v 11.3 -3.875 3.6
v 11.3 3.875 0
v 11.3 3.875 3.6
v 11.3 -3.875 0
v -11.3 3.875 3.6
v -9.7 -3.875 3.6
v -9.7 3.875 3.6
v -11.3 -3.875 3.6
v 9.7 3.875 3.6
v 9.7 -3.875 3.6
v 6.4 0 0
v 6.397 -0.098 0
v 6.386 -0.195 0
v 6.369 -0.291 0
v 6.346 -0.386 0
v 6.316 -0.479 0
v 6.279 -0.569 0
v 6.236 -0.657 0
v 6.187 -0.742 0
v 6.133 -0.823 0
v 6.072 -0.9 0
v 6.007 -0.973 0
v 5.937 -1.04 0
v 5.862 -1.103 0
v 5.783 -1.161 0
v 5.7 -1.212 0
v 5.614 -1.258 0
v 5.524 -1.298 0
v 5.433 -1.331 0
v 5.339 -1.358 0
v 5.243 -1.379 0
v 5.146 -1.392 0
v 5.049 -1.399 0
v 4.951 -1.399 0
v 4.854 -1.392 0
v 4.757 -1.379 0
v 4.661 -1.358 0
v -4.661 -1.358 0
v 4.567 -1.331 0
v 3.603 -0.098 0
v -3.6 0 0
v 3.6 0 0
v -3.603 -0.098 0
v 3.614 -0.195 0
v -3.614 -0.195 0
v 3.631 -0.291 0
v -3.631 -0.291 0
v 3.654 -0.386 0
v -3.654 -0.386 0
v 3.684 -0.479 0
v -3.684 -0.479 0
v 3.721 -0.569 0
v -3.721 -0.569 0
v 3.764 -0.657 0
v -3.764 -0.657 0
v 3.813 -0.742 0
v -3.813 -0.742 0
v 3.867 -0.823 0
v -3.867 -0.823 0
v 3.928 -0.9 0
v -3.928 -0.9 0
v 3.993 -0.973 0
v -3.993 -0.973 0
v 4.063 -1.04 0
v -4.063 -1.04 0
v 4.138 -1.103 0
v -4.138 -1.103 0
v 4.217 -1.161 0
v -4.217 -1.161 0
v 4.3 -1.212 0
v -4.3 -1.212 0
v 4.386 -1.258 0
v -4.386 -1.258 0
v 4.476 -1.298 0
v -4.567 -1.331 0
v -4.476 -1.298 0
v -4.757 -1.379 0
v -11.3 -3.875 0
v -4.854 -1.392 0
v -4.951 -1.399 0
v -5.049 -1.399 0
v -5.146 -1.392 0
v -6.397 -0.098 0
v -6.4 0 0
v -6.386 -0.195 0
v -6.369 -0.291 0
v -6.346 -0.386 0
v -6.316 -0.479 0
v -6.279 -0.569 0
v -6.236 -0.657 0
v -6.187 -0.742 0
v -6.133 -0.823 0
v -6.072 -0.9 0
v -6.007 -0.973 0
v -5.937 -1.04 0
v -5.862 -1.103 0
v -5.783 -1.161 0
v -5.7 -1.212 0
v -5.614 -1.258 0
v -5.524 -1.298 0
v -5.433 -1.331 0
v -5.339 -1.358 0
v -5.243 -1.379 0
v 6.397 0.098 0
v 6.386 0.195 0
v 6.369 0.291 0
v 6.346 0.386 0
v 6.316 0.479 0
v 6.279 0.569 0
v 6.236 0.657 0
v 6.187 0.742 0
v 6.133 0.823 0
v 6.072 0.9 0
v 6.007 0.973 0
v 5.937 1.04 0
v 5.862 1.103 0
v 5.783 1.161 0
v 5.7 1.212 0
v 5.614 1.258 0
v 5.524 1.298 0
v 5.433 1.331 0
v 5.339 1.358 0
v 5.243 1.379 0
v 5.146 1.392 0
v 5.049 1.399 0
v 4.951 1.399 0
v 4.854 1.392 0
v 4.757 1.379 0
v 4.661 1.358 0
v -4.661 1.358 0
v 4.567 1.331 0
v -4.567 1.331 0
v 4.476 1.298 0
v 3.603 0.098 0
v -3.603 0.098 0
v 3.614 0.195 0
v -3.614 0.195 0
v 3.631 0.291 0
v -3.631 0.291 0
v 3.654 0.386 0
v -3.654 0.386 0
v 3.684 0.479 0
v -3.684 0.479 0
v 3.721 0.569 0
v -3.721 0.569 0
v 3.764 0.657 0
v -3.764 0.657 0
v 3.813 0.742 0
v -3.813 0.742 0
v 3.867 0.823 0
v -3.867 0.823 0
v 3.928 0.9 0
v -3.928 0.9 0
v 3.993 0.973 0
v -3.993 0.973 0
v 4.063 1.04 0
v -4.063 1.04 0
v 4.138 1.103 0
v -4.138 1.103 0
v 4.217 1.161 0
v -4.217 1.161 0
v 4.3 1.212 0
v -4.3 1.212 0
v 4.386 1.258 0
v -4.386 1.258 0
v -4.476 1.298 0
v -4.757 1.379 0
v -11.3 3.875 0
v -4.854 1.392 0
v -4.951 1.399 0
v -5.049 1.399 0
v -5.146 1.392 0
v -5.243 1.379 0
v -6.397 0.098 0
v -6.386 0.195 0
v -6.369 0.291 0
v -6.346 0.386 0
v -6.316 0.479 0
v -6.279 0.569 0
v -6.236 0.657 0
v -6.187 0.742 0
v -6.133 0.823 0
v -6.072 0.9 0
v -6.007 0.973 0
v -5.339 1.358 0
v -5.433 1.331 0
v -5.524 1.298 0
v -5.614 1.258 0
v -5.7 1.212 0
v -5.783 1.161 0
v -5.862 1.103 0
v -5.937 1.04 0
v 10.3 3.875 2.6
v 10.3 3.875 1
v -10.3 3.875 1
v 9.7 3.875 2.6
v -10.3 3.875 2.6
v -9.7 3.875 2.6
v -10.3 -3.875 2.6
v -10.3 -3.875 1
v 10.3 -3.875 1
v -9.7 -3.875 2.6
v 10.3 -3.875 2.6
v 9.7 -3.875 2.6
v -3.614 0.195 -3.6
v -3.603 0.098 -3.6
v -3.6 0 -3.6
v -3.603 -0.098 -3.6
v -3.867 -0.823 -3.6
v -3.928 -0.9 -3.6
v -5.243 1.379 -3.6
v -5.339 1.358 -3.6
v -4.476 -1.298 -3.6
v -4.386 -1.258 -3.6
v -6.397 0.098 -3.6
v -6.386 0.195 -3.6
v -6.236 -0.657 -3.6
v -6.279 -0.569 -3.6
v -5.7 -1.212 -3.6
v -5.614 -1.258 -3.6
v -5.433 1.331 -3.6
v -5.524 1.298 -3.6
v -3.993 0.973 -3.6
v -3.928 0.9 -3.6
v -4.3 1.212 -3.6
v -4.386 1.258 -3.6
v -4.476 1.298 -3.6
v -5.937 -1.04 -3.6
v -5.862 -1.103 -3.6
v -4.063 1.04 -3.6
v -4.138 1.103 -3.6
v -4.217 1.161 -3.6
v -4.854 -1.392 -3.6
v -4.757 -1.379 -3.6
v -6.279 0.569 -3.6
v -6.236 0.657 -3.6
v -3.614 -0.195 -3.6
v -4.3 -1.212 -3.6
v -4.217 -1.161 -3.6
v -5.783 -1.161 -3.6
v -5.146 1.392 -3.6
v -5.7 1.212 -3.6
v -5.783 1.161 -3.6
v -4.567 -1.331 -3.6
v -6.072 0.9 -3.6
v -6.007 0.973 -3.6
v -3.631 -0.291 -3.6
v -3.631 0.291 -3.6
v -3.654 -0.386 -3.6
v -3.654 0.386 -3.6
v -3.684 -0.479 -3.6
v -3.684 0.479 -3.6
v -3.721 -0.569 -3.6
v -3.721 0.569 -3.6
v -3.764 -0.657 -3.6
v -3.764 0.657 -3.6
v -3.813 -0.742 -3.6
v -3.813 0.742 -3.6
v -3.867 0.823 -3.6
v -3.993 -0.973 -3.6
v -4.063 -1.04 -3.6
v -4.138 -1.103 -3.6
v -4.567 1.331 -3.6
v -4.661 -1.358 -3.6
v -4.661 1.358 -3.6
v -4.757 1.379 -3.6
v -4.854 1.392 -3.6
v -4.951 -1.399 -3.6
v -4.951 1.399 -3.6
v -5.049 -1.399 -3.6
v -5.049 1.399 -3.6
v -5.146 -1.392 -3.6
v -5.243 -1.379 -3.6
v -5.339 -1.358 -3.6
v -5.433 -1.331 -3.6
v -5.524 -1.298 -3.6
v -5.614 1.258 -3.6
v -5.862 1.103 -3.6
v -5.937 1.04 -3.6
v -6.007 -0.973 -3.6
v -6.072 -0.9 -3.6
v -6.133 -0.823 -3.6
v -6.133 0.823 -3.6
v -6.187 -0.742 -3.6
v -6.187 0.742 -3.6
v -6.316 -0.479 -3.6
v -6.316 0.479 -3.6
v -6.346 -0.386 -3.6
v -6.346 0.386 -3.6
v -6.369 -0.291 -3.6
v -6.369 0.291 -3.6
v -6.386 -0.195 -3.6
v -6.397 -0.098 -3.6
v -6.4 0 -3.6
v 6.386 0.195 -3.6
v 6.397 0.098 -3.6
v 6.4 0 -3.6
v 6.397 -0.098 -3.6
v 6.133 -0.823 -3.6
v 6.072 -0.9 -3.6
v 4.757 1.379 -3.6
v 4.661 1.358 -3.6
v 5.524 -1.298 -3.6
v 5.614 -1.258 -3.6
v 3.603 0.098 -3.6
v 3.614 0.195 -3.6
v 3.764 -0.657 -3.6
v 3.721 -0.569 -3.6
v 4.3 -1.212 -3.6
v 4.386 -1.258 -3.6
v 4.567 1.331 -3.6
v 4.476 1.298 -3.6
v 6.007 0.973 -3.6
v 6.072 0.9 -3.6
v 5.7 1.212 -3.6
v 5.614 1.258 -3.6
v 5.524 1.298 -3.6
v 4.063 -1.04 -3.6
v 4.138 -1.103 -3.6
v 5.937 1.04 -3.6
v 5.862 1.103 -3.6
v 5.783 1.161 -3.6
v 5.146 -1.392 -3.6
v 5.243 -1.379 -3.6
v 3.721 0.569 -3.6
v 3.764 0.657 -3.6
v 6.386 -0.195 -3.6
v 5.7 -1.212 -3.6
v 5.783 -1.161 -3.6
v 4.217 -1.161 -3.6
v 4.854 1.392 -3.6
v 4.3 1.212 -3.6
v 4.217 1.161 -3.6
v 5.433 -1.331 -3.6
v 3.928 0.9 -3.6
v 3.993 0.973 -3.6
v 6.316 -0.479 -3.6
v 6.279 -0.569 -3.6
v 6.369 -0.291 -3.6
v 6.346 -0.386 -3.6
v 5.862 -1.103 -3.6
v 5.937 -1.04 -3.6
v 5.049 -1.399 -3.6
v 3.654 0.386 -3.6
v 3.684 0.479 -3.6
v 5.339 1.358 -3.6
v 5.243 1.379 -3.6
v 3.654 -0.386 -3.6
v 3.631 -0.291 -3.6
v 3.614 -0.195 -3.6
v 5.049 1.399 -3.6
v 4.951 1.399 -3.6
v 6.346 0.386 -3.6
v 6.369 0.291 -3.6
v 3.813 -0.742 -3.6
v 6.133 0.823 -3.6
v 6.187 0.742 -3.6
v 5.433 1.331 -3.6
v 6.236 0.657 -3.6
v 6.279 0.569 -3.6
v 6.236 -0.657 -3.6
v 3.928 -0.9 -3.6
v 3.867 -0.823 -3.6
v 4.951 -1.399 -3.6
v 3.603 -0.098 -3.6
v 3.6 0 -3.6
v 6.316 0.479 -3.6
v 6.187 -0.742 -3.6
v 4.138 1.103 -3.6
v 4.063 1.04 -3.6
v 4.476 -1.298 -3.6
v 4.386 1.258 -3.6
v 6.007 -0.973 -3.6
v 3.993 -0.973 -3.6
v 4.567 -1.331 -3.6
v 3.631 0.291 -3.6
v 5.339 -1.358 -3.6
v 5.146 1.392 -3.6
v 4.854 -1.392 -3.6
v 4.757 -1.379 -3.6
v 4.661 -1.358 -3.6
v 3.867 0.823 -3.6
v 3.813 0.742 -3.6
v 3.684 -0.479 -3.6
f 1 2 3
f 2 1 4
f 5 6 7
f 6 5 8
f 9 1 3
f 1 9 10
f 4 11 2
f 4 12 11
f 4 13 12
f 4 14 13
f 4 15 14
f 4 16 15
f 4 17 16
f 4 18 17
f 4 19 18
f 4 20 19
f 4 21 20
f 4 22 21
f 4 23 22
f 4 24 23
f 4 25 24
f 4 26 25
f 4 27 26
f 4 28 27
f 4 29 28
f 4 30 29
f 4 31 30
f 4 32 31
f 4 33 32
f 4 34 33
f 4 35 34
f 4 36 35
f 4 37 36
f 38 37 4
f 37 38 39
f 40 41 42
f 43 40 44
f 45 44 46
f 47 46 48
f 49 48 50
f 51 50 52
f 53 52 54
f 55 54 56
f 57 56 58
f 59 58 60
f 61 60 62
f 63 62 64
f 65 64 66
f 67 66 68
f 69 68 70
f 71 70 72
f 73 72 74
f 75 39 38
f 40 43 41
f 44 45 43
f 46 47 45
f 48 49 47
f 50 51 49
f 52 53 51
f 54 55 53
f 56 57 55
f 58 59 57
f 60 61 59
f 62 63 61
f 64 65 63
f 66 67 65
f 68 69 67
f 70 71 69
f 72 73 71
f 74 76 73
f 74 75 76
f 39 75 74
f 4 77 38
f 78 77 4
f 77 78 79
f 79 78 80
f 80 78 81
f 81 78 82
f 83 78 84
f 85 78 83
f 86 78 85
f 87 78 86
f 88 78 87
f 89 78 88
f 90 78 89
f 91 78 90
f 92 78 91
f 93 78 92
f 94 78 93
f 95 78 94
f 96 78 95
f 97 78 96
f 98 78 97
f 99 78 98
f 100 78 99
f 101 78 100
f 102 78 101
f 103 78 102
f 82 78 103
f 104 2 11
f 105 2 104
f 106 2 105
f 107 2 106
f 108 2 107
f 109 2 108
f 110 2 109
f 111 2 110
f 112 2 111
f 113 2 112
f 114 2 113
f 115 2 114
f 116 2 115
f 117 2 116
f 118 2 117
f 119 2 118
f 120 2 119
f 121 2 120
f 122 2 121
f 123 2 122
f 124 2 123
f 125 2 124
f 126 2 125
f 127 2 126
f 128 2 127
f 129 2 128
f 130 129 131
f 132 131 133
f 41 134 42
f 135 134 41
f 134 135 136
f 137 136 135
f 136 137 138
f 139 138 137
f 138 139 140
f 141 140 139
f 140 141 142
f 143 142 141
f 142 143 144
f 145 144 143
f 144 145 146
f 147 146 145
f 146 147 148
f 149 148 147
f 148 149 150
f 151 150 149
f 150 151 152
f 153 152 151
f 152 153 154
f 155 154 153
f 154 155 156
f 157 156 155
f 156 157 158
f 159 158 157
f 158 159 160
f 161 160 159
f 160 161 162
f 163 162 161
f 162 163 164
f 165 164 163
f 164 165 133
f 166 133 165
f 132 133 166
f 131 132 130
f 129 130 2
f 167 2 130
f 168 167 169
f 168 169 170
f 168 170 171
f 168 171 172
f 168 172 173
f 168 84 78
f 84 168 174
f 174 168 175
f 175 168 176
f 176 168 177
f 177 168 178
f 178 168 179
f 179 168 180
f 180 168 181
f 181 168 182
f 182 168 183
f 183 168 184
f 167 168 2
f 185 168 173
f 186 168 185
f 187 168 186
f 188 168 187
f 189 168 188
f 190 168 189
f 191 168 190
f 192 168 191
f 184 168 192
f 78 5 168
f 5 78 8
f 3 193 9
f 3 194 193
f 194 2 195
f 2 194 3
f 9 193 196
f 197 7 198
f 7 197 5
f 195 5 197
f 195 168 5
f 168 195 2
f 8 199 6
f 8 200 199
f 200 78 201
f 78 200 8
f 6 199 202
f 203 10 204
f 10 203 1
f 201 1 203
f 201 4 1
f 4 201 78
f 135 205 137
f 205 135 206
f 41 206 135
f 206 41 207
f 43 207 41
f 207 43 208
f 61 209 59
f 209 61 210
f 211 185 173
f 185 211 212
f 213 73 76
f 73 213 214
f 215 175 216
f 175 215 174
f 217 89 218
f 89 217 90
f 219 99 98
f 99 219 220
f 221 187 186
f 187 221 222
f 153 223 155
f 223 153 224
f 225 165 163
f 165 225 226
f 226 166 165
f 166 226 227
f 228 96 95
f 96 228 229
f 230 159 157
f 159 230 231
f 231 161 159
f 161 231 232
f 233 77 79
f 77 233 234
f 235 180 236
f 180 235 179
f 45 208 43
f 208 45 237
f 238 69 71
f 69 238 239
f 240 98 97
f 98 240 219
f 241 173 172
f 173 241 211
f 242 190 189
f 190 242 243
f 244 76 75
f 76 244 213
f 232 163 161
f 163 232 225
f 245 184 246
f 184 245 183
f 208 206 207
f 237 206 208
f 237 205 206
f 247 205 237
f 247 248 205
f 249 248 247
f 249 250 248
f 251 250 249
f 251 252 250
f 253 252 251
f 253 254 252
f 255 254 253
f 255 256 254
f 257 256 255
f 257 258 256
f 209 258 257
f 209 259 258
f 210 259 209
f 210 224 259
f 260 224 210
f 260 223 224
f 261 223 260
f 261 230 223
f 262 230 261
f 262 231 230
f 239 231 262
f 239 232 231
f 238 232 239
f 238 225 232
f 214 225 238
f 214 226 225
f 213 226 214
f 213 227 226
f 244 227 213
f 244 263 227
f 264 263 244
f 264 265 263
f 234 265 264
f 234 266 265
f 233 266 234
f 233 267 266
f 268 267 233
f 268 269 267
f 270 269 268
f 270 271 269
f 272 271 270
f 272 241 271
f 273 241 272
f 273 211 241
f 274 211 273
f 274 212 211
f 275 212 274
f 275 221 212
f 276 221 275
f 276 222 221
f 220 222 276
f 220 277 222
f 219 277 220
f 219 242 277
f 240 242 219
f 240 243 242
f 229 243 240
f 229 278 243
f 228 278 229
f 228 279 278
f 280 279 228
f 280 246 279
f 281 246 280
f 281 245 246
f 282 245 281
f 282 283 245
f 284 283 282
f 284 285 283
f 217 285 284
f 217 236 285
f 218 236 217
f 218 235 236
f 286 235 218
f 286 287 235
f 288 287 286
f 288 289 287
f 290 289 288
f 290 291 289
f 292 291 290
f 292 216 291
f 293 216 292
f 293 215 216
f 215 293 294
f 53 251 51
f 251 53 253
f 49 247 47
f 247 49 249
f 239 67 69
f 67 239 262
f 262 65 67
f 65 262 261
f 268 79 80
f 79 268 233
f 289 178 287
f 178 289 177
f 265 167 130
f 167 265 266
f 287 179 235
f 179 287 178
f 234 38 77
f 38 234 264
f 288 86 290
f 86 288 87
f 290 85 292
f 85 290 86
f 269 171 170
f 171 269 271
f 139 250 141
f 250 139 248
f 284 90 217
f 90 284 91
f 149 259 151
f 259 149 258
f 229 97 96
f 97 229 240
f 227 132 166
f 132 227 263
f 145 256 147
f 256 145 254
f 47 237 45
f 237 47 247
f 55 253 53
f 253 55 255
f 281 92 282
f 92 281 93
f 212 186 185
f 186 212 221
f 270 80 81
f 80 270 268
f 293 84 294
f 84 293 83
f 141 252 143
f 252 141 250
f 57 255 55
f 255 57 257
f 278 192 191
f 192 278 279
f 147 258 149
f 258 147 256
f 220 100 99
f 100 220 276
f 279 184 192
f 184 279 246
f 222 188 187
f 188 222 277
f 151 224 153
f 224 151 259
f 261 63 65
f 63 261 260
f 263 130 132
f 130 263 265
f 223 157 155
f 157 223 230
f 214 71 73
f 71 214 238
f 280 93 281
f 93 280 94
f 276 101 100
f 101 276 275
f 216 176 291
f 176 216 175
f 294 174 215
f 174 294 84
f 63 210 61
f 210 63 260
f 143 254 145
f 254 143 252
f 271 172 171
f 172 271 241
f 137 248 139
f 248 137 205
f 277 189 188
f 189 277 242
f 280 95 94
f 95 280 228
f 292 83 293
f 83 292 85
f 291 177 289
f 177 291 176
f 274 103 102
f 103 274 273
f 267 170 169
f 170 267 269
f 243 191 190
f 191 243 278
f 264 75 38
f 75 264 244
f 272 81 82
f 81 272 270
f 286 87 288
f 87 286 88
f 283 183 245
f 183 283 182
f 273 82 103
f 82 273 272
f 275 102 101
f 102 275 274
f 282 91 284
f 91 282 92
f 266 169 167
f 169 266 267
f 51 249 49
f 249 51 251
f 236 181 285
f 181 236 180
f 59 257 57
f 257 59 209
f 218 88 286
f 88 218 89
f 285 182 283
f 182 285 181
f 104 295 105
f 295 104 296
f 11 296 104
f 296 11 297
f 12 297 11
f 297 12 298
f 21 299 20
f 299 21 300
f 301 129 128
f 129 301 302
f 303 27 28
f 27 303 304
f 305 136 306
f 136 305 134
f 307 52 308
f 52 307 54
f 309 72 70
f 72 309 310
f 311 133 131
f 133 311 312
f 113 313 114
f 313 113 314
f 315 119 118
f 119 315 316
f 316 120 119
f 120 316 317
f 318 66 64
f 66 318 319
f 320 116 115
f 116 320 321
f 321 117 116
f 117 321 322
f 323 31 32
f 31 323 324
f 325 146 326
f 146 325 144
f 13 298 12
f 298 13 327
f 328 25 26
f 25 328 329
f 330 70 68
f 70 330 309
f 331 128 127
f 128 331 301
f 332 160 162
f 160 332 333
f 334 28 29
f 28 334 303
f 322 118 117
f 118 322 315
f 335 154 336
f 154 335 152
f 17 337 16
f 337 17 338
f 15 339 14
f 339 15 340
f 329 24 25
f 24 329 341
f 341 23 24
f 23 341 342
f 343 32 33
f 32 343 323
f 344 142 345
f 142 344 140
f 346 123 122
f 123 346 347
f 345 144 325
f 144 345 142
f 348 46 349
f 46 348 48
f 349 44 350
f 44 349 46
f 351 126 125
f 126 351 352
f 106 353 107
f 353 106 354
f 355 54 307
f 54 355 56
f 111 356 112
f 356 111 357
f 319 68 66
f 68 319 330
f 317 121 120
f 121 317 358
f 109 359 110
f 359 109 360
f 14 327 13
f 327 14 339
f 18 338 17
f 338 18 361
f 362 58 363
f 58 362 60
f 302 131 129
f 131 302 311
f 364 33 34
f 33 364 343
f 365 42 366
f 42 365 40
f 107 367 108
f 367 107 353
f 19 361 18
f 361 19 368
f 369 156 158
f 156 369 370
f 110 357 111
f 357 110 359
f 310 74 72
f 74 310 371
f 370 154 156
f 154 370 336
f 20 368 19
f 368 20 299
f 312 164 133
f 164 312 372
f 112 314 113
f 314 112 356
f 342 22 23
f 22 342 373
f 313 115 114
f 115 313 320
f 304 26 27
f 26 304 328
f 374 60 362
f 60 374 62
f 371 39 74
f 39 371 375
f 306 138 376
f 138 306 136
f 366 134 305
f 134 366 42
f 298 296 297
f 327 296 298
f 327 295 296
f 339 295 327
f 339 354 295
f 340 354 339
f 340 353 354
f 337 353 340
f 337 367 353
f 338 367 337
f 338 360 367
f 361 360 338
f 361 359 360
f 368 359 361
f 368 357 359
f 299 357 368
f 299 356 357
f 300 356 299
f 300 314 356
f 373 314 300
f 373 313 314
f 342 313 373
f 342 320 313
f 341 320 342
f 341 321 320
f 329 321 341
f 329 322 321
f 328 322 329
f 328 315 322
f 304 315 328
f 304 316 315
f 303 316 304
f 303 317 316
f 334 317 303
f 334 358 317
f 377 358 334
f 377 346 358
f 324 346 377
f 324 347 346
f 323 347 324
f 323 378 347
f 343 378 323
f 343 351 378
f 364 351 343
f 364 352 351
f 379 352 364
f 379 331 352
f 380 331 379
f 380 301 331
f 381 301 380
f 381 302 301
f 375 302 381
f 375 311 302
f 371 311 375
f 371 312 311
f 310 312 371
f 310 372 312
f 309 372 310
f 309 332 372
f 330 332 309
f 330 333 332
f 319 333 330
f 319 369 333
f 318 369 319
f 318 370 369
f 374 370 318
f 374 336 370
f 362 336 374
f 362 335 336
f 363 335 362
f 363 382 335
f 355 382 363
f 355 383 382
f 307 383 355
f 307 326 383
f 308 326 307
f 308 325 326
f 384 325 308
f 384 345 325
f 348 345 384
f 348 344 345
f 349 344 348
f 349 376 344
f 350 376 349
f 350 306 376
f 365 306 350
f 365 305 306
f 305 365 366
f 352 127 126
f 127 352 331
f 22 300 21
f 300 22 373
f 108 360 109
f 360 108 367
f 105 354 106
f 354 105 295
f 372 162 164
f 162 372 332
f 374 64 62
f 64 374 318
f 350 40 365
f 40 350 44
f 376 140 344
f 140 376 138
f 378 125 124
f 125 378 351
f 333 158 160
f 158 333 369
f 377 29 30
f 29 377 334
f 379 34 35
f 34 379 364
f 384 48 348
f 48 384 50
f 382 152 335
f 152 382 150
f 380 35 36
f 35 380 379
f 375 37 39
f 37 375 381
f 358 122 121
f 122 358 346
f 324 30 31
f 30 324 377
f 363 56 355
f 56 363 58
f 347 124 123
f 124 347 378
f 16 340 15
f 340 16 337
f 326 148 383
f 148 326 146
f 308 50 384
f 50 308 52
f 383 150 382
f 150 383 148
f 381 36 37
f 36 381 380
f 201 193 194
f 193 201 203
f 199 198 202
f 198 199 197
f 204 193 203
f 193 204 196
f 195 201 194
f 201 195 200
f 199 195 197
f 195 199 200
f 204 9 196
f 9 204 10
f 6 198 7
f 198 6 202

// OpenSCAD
$fn=90;

module stp_drv_pos() {
    drv_l=20.6;
    drv_w=15.5;
    drv_h=1.6;
    s_d=2.8;
    s_h=4;
    gap=1;
    
    difference() {
        union() {
            translate([0,0,drv_h/2+gap]) {
                cube([drv_l+2*gap,drv_w/2,drv_h+2*gap], center=true);
            }
            translate([-5,0,-drv_h-2*gap]) {
                cylinder(s_h, d=s_d);
            }
            translate([5,0,-drv_h-2*gap]) {
                cylinder(s_h, d=s_d);
            }
        }
        translate([0,0,drv_h/2+gap]) {
            cube([drv_l,drv_w,drv_h], center=true);
        }
        translate([0,0,drv_h+gap]) {
            cube([drv_l-1.2,drv_w,2*gap], center=true);
        }
    }
}

stp_drv_pos();
